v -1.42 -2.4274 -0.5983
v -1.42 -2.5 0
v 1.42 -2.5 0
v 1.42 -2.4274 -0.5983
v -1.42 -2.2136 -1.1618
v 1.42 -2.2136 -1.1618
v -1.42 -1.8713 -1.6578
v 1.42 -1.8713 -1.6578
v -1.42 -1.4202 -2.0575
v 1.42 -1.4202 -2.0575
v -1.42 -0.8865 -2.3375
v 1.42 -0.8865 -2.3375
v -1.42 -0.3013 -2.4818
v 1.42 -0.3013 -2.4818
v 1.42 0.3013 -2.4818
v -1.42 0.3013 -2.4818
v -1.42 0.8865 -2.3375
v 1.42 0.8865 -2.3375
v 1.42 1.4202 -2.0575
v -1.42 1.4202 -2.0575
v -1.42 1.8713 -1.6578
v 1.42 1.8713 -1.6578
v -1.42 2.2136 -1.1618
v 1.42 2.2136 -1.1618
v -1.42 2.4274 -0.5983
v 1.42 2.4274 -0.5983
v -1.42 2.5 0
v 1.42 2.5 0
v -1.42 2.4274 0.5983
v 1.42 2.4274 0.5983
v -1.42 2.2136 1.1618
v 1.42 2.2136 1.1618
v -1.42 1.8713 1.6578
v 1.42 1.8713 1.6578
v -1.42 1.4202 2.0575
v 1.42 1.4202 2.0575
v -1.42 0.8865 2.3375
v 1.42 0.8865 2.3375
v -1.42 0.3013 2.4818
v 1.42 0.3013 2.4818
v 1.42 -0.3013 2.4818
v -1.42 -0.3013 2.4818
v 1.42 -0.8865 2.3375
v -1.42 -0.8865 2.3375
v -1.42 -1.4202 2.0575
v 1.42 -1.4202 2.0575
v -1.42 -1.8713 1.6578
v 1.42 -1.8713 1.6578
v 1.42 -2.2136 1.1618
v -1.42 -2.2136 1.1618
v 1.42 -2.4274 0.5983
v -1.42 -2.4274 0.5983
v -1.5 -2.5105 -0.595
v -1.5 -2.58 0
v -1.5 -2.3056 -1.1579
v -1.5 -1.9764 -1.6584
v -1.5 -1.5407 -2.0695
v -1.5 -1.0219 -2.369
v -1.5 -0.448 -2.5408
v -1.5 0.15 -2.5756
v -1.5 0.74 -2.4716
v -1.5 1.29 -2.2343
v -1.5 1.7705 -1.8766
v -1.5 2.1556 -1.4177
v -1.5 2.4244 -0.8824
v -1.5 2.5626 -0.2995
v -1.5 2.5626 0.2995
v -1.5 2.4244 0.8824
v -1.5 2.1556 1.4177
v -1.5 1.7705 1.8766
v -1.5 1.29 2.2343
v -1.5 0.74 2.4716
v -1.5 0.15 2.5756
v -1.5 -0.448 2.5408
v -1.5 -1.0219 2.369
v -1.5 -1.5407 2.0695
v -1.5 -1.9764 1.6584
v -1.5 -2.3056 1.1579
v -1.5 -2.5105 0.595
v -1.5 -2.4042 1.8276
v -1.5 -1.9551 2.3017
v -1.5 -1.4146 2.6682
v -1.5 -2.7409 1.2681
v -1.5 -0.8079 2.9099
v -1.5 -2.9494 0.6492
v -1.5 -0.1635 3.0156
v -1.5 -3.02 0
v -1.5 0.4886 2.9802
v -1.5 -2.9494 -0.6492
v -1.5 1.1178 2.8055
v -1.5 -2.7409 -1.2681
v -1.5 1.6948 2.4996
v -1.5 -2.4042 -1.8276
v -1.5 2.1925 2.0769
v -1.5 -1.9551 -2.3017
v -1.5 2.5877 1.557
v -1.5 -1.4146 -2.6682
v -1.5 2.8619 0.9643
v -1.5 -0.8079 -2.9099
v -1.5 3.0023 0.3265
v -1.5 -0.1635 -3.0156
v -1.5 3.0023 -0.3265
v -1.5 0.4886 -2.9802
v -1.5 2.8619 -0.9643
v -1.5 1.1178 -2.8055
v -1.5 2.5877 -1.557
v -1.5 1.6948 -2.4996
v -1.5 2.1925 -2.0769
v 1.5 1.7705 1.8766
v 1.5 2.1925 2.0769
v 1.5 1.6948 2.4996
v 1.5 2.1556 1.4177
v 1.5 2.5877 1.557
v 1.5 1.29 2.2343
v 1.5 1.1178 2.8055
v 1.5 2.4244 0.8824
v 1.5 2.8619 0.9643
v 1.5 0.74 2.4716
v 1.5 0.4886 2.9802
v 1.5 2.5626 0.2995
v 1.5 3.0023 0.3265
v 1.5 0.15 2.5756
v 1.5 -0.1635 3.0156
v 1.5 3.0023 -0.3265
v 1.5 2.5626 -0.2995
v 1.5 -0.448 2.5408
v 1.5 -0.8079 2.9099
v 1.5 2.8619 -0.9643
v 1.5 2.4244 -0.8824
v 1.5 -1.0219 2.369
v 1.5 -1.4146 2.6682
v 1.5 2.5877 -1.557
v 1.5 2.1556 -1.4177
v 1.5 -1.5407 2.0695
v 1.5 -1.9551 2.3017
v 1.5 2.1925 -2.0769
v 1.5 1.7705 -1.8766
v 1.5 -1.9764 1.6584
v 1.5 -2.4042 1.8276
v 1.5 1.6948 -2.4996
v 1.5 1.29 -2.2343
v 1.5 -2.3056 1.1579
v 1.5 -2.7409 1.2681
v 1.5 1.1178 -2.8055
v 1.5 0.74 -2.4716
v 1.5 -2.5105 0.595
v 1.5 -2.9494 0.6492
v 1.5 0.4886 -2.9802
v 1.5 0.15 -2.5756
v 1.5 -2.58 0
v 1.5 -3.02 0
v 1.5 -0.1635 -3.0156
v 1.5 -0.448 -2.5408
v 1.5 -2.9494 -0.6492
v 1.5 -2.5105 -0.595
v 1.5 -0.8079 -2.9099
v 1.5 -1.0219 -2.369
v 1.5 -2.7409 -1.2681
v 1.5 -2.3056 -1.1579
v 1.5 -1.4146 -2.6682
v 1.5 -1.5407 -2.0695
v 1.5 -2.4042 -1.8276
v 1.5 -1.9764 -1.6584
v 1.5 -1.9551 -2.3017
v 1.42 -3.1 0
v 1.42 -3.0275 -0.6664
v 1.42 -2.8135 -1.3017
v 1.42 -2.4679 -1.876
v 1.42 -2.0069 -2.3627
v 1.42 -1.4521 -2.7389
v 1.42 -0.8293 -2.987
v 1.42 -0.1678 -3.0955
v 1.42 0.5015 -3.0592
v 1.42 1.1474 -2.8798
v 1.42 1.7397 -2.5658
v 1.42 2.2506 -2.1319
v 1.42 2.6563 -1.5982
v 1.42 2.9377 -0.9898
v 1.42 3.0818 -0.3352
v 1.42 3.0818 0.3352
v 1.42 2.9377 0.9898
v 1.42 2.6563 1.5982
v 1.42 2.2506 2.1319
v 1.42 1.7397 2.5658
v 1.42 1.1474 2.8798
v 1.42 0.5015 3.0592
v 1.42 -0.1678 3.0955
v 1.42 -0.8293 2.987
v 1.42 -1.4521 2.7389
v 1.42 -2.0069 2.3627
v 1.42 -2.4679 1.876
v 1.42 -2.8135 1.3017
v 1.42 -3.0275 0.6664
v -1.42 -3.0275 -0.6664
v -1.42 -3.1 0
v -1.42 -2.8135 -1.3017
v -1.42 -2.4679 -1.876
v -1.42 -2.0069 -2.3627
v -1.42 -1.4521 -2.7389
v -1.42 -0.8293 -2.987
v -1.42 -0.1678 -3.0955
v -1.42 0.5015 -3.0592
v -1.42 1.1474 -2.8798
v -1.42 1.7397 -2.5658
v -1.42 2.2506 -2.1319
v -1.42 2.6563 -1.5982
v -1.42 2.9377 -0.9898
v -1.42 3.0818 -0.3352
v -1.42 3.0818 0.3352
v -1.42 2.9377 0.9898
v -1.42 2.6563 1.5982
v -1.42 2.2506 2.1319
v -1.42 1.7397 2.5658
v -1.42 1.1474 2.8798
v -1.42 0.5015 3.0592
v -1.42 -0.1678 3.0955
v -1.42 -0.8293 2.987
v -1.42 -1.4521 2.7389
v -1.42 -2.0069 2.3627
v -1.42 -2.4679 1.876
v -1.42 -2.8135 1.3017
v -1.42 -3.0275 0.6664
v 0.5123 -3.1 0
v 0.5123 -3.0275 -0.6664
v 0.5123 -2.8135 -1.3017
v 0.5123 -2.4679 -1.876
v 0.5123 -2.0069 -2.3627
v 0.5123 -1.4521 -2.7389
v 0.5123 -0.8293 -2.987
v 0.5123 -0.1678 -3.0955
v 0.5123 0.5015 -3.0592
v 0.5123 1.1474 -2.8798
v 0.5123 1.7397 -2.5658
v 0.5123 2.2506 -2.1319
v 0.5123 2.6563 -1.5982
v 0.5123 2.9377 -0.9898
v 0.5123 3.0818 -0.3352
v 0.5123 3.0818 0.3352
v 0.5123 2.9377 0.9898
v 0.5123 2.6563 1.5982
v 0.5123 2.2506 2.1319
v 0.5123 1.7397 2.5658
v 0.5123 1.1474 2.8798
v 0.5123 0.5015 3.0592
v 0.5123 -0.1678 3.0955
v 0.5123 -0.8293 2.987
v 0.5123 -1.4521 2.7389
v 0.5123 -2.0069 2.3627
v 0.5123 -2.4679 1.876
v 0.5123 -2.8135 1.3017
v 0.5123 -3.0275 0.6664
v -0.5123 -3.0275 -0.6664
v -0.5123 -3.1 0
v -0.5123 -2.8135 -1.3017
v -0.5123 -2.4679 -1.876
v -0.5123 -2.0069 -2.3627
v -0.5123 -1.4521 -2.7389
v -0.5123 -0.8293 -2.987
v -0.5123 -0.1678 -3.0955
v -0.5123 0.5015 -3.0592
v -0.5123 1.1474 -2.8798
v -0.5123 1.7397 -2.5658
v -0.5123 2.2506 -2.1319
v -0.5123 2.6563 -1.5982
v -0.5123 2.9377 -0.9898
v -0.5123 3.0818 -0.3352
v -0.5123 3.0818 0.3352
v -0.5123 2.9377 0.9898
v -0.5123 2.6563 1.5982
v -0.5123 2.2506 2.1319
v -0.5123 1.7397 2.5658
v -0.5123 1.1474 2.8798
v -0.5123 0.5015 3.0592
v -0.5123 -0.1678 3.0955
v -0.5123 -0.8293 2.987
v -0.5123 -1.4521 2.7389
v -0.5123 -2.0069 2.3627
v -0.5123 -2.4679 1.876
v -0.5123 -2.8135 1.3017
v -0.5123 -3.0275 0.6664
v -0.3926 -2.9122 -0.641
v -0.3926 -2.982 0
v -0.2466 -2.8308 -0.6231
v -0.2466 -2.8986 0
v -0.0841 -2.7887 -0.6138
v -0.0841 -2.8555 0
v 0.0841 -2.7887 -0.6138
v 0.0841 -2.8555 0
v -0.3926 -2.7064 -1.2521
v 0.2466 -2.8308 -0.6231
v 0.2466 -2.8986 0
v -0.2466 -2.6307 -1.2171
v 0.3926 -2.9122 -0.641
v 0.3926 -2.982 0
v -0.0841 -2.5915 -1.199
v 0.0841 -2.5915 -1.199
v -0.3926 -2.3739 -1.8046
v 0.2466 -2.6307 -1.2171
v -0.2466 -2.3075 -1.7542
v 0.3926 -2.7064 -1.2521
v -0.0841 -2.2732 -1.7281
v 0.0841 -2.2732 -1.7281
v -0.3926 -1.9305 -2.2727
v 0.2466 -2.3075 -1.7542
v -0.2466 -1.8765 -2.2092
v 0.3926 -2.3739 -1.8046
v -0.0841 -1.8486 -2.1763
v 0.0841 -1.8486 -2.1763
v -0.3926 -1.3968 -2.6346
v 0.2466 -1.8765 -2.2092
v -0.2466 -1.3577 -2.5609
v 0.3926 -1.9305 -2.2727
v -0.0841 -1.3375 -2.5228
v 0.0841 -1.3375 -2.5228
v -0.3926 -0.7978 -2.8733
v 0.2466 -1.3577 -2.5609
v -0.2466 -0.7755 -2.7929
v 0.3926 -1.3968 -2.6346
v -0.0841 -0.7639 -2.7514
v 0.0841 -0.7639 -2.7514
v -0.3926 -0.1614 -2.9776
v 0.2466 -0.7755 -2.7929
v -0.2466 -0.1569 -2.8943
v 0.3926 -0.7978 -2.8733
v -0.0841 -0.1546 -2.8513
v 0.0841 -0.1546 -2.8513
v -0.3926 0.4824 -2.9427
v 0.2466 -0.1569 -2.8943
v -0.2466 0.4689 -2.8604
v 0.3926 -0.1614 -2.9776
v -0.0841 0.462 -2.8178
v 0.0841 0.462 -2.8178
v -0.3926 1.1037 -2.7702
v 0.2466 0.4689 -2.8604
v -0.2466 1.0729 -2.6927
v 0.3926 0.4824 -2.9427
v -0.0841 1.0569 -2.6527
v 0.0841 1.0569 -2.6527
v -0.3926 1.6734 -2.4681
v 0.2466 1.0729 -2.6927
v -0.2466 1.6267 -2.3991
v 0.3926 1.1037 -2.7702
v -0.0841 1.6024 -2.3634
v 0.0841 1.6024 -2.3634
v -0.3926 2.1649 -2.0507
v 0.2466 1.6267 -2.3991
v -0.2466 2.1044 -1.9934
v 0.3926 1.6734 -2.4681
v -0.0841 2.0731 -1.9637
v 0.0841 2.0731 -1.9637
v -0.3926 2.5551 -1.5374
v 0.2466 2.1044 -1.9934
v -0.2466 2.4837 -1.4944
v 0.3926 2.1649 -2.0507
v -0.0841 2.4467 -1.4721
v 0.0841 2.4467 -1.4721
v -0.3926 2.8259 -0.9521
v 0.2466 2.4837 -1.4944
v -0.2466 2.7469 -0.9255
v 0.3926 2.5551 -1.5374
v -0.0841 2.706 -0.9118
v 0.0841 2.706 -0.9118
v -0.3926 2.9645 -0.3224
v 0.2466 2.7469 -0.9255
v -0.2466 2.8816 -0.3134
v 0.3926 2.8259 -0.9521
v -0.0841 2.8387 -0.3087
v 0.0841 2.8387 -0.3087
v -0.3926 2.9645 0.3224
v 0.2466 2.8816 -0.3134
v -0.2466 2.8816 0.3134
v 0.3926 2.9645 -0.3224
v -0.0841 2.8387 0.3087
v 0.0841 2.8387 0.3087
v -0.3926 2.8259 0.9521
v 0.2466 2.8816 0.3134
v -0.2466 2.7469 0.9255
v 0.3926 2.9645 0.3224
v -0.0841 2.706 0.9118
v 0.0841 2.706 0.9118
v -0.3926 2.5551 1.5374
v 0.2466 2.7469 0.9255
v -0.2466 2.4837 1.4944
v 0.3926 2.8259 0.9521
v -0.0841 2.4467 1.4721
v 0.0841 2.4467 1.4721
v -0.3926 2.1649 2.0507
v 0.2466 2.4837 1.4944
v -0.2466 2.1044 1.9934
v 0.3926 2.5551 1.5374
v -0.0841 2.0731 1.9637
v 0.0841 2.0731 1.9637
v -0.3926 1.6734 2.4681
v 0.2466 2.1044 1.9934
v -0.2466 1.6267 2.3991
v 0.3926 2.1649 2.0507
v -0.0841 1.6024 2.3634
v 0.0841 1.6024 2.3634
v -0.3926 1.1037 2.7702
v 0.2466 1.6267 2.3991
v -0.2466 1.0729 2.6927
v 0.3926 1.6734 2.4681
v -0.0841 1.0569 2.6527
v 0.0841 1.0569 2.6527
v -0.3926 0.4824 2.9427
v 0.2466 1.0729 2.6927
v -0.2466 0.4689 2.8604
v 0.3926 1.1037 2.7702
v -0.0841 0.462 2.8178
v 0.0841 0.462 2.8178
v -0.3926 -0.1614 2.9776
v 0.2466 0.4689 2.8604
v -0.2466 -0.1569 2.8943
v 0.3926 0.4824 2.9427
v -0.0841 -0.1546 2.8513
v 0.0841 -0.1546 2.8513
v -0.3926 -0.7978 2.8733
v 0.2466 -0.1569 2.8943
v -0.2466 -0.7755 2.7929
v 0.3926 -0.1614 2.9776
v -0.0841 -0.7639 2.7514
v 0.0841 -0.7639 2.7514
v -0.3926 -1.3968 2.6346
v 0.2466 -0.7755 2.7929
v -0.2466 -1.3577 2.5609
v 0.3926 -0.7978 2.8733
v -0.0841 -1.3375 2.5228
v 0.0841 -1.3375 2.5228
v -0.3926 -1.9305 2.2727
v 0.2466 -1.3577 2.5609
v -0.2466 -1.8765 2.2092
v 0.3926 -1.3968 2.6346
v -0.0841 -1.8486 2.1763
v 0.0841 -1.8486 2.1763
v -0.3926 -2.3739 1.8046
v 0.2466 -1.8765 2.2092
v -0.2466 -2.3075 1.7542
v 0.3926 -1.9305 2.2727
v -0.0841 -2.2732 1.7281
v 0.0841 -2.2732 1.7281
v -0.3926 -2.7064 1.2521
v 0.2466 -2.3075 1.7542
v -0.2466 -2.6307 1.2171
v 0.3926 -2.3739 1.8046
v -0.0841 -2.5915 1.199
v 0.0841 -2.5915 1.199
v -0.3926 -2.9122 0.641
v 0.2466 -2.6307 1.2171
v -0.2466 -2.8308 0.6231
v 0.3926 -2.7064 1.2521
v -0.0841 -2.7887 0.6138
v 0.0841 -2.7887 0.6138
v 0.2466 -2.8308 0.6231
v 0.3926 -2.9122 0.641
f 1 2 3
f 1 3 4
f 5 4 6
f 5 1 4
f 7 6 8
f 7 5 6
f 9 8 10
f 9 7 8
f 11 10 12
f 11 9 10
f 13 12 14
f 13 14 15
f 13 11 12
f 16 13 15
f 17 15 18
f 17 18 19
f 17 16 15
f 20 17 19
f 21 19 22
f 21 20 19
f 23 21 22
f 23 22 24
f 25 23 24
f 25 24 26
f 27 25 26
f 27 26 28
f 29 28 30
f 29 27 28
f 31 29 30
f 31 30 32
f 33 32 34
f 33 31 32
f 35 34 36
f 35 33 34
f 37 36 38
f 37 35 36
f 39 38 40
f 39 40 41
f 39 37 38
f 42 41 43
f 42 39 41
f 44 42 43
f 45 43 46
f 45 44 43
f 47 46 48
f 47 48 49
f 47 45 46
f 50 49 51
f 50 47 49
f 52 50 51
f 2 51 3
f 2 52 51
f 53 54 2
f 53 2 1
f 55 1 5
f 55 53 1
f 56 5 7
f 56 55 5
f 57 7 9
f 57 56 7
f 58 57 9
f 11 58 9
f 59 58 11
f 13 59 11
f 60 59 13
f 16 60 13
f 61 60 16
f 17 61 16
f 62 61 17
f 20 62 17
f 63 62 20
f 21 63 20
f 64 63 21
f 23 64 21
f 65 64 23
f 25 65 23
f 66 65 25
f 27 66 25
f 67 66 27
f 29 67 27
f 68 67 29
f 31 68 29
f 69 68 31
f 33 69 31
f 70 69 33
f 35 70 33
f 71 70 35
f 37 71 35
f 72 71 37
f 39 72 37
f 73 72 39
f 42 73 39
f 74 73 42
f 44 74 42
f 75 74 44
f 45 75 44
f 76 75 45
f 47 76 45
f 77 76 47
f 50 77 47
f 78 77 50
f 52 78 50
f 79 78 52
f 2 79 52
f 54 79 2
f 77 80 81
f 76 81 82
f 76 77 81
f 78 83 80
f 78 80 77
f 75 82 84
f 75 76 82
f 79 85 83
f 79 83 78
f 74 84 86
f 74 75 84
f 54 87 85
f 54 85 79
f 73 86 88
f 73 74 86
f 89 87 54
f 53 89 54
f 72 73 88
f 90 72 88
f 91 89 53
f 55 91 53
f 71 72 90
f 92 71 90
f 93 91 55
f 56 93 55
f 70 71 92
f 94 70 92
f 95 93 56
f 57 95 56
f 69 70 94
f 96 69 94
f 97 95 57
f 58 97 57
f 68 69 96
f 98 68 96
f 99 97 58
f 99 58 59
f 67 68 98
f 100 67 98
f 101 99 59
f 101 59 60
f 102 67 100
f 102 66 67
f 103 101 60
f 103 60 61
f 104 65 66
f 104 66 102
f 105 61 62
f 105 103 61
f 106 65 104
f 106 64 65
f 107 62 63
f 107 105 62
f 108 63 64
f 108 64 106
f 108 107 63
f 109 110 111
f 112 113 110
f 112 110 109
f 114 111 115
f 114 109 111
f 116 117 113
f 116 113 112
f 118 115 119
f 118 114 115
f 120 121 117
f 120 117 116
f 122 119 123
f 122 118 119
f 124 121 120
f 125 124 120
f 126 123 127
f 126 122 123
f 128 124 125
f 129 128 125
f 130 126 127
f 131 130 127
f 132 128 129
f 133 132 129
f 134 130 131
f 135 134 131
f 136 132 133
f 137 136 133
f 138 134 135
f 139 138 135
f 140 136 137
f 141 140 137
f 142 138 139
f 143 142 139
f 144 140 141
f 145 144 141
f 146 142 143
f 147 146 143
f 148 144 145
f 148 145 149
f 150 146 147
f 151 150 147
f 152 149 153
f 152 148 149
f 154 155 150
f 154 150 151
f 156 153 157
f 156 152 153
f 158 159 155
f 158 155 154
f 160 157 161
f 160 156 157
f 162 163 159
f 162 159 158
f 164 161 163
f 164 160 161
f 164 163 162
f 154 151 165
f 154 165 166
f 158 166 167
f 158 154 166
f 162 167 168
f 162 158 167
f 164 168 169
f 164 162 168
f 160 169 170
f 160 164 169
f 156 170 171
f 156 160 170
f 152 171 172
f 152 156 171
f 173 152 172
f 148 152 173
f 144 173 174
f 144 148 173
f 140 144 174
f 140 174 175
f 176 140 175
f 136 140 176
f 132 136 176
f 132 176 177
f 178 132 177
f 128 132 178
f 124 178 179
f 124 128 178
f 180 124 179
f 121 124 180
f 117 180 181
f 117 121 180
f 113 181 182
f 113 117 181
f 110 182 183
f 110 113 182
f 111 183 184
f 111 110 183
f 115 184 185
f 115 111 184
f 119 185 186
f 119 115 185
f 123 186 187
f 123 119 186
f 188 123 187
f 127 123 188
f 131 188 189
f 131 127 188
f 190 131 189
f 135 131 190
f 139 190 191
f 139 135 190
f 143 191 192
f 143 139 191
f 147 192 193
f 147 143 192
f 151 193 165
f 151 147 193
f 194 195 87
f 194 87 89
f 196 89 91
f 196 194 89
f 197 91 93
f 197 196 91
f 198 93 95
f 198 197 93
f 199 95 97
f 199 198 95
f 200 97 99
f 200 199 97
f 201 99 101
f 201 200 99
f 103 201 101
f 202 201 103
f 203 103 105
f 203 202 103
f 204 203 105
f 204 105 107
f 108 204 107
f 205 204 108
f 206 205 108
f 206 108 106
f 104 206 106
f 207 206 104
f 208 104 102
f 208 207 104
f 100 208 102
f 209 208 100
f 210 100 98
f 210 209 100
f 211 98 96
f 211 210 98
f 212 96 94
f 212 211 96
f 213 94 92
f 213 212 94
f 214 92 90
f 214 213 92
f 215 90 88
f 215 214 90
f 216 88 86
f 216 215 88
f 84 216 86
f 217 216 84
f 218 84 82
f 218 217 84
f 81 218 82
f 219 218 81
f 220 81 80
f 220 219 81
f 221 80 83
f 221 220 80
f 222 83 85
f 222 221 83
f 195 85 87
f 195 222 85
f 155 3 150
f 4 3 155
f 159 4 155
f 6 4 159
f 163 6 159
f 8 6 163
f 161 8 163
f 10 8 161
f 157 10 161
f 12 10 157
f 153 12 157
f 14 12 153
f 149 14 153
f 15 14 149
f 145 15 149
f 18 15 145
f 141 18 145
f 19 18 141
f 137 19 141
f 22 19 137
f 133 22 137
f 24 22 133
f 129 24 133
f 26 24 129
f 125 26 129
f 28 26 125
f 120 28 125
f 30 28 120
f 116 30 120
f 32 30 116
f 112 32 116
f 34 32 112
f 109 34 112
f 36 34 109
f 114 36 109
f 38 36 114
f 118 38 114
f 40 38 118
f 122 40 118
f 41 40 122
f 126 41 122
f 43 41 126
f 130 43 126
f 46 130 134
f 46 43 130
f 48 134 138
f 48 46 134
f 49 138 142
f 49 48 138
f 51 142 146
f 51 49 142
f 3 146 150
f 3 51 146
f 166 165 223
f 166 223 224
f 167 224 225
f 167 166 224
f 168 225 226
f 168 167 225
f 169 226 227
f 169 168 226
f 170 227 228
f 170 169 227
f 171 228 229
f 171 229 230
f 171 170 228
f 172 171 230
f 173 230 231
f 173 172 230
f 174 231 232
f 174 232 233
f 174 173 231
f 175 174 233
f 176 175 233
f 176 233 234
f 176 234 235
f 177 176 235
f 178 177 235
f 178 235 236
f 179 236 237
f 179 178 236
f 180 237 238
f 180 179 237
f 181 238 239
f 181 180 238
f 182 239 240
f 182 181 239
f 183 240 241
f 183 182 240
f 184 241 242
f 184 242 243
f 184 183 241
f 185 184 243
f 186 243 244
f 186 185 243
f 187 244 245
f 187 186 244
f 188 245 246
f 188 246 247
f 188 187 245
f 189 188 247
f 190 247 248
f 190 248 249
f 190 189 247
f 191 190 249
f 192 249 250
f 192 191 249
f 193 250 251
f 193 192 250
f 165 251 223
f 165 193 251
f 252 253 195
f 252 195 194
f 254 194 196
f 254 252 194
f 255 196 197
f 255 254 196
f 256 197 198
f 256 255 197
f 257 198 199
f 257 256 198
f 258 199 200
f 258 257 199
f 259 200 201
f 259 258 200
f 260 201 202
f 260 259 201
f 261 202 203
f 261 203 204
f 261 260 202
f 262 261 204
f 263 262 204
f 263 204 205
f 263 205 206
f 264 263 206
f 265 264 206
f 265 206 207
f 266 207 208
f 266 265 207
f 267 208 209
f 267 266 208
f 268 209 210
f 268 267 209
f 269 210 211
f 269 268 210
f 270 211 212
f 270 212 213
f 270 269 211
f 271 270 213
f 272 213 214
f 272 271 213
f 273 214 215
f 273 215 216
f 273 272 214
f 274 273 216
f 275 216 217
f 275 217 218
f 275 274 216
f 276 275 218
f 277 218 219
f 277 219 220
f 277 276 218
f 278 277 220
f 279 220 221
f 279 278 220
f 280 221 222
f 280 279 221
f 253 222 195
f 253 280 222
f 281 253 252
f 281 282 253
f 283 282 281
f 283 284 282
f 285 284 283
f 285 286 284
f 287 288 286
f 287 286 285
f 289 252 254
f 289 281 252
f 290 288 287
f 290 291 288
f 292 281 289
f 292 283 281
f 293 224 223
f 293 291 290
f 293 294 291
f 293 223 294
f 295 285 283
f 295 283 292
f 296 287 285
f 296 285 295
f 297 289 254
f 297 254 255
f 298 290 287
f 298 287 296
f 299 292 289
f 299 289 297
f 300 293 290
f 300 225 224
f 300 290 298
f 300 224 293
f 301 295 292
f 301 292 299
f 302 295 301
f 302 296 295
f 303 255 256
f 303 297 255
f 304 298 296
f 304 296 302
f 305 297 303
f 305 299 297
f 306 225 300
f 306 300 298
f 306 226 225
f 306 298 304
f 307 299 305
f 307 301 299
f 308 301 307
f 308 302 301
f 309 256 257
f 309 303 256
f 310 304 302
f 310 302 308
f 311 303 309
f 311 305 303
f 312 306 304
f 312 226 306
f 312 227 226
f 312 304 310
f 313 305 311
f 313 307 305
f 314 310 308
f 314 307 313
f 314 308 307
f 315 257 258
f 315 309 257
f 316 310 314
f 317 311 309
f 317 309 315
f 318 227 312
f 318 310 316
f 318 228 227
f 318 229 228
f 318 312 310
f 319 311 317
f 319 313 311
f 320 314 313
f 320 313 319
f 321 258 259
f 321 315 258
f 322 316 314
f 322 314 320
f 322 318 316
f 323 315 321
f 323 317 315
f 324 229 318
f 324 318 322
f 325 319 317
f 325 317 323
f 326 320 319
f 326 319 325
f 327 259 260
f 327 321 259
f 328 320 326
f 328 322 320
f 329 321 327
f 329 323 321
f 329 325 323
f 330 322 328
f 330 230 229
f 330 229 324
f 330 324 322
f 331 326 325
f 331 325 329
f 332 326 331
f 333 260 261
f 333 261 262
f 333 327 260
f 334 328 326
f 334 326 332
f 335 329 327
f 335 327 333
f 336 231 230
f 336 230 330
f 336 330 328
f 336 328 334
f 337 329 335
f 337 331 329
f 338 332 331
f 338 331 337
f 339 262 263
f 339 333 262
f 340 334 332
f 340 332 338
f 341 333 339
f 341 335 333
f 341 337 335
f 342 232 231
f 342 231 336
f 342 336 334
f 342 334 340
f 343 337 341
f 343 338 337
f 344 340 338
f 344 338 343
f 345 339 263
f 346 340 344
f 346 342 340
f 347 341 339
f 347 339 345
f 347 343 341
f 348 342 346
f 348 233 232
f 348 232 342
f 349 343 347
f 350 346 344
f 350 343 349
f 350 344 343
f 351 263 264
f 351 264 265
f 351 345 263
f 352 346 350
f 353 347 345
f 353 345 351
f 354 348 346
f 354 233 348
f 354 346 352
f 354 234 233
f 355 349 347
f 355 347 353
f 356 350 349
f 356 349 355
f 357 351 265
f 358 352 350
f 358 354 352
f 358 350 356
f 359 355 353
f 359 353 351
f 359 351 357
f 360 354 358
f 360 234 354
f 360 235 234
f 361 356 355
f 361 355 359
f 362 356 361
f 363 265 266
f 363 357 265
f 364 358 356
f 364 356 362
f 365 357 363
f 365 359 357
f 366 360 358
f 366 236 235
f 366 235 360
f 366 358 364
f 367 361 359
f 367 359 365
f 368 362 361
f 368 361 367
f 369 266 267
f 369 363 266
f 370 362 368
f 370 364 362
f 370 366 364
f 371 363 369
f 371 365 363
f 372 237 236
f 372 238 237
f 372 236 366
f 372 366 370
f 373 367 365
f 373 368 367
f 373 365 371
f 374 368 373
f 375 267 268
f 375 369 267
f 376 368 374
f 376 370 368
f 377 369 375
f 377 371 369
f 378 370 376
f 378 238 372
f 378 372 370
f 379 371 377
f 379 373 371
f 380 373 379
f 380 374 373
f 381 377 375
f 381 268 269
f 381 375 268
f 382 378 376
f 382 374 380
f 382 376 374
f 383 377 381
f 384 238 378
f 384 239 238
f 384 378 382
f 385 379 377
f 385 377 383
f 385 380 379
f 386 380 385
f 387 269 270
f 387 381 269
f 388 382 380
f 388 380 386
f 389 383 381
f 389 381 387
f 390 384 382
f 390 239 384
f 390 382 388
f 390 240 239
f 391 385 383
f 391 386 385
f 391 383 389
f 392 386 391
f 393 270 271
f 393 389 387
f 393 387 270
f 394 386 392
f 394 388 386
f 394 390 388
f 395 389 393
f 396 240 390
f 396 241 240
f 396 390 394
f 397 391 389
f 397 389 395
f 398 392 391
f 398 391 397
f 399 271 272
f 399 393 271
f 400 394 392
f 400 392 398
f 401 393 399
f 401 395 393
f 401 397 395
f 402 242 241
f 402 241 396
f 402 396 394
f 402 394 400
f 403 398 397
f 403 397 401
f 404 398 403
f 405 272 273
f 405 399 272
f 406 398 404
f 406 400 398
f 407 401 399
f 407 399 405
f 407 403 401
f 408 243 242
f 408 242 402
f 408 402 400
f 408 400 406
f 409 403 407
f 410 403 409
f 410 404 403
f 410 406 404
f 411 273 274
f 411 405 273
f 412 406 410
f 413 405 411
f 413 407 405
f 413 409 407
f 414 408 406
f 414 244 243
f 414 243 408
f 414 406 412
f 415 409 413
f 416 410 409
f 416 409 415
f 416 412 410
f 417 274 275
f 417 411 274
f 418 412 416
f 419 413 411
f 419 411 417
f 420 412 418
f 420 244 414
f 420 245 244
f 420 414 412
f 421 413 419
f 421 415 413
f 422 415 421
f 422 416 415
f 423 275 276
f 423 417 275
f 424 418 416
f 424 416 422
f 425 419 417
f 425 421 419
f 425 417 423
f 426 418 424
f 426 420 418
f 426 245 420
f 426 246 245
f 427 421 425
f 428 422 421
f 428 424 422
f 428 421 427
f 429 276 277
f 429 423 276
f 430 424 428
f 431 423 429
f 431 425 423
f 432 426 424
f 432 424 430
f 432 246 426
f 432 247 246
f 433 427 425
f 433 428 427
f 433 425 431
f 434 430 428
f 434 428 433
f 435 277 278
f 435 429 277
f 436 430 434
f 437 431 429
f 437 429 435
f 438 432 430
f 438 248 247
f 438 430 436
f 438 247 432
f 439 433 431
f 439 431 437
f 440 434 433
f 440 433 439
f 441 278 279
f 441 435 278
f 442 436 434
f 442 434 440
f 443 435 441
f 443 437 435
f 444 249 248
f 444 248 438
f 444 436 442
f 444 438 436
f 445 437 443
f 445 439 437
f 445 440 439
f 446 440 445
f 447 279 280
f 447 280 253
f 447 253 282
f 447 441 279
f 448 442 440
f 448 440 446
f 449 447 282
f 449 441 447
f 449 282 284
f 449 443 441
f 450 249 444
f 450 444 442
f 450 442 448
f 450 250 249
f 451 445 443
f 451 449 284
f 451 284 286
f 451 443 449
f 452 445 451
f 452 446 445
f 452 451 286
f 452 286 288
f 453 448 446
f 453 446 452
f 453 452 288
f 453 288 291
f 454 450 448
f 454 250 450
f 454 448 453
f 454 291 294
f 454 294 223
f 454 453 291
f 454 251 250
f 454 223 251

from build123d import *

# Parameters (mm, degrees)
CHAMFER2_SIZE = 0.08


with BuildPart() as part:
    # Sketch1 → Revolve1 (revolve)
    with BuildSketch(Plane.XY):
        with BuildLine():
            Line((0.512347538, -3.1), (1.5, -3.1))
            Line((1.5, -3.1), (1.5, -2.5))
            Line((1.5, -2.5), (-1.5, -2.5))
            Line((-1.5, -2.5), (-1.5, -3.1))
            Line((-1.5, -3.1), (-0.512347538, -3.1))
            ThreePointArc((-0.512347538, -3.1), (0, -2.85), (0.512347538, -3.1))
        make_face()
    revolve(axis=Axis((-6.429017492, 0, 0), (1, 0, 0)))

    # Chamfer2
    chamfer2_edges = [part.edges().sort_by_distance(p)[0] for p in [
        (1.5, 3.1, 0),
        (1.5, 2.5, 0),
        (-1.5, 2.5, 0),
        (-1.5, 3.1, 0),
    ]]
    chamfer(chamfer2_edges, length=CHAMFER2_SIZE)


solid = part.part
